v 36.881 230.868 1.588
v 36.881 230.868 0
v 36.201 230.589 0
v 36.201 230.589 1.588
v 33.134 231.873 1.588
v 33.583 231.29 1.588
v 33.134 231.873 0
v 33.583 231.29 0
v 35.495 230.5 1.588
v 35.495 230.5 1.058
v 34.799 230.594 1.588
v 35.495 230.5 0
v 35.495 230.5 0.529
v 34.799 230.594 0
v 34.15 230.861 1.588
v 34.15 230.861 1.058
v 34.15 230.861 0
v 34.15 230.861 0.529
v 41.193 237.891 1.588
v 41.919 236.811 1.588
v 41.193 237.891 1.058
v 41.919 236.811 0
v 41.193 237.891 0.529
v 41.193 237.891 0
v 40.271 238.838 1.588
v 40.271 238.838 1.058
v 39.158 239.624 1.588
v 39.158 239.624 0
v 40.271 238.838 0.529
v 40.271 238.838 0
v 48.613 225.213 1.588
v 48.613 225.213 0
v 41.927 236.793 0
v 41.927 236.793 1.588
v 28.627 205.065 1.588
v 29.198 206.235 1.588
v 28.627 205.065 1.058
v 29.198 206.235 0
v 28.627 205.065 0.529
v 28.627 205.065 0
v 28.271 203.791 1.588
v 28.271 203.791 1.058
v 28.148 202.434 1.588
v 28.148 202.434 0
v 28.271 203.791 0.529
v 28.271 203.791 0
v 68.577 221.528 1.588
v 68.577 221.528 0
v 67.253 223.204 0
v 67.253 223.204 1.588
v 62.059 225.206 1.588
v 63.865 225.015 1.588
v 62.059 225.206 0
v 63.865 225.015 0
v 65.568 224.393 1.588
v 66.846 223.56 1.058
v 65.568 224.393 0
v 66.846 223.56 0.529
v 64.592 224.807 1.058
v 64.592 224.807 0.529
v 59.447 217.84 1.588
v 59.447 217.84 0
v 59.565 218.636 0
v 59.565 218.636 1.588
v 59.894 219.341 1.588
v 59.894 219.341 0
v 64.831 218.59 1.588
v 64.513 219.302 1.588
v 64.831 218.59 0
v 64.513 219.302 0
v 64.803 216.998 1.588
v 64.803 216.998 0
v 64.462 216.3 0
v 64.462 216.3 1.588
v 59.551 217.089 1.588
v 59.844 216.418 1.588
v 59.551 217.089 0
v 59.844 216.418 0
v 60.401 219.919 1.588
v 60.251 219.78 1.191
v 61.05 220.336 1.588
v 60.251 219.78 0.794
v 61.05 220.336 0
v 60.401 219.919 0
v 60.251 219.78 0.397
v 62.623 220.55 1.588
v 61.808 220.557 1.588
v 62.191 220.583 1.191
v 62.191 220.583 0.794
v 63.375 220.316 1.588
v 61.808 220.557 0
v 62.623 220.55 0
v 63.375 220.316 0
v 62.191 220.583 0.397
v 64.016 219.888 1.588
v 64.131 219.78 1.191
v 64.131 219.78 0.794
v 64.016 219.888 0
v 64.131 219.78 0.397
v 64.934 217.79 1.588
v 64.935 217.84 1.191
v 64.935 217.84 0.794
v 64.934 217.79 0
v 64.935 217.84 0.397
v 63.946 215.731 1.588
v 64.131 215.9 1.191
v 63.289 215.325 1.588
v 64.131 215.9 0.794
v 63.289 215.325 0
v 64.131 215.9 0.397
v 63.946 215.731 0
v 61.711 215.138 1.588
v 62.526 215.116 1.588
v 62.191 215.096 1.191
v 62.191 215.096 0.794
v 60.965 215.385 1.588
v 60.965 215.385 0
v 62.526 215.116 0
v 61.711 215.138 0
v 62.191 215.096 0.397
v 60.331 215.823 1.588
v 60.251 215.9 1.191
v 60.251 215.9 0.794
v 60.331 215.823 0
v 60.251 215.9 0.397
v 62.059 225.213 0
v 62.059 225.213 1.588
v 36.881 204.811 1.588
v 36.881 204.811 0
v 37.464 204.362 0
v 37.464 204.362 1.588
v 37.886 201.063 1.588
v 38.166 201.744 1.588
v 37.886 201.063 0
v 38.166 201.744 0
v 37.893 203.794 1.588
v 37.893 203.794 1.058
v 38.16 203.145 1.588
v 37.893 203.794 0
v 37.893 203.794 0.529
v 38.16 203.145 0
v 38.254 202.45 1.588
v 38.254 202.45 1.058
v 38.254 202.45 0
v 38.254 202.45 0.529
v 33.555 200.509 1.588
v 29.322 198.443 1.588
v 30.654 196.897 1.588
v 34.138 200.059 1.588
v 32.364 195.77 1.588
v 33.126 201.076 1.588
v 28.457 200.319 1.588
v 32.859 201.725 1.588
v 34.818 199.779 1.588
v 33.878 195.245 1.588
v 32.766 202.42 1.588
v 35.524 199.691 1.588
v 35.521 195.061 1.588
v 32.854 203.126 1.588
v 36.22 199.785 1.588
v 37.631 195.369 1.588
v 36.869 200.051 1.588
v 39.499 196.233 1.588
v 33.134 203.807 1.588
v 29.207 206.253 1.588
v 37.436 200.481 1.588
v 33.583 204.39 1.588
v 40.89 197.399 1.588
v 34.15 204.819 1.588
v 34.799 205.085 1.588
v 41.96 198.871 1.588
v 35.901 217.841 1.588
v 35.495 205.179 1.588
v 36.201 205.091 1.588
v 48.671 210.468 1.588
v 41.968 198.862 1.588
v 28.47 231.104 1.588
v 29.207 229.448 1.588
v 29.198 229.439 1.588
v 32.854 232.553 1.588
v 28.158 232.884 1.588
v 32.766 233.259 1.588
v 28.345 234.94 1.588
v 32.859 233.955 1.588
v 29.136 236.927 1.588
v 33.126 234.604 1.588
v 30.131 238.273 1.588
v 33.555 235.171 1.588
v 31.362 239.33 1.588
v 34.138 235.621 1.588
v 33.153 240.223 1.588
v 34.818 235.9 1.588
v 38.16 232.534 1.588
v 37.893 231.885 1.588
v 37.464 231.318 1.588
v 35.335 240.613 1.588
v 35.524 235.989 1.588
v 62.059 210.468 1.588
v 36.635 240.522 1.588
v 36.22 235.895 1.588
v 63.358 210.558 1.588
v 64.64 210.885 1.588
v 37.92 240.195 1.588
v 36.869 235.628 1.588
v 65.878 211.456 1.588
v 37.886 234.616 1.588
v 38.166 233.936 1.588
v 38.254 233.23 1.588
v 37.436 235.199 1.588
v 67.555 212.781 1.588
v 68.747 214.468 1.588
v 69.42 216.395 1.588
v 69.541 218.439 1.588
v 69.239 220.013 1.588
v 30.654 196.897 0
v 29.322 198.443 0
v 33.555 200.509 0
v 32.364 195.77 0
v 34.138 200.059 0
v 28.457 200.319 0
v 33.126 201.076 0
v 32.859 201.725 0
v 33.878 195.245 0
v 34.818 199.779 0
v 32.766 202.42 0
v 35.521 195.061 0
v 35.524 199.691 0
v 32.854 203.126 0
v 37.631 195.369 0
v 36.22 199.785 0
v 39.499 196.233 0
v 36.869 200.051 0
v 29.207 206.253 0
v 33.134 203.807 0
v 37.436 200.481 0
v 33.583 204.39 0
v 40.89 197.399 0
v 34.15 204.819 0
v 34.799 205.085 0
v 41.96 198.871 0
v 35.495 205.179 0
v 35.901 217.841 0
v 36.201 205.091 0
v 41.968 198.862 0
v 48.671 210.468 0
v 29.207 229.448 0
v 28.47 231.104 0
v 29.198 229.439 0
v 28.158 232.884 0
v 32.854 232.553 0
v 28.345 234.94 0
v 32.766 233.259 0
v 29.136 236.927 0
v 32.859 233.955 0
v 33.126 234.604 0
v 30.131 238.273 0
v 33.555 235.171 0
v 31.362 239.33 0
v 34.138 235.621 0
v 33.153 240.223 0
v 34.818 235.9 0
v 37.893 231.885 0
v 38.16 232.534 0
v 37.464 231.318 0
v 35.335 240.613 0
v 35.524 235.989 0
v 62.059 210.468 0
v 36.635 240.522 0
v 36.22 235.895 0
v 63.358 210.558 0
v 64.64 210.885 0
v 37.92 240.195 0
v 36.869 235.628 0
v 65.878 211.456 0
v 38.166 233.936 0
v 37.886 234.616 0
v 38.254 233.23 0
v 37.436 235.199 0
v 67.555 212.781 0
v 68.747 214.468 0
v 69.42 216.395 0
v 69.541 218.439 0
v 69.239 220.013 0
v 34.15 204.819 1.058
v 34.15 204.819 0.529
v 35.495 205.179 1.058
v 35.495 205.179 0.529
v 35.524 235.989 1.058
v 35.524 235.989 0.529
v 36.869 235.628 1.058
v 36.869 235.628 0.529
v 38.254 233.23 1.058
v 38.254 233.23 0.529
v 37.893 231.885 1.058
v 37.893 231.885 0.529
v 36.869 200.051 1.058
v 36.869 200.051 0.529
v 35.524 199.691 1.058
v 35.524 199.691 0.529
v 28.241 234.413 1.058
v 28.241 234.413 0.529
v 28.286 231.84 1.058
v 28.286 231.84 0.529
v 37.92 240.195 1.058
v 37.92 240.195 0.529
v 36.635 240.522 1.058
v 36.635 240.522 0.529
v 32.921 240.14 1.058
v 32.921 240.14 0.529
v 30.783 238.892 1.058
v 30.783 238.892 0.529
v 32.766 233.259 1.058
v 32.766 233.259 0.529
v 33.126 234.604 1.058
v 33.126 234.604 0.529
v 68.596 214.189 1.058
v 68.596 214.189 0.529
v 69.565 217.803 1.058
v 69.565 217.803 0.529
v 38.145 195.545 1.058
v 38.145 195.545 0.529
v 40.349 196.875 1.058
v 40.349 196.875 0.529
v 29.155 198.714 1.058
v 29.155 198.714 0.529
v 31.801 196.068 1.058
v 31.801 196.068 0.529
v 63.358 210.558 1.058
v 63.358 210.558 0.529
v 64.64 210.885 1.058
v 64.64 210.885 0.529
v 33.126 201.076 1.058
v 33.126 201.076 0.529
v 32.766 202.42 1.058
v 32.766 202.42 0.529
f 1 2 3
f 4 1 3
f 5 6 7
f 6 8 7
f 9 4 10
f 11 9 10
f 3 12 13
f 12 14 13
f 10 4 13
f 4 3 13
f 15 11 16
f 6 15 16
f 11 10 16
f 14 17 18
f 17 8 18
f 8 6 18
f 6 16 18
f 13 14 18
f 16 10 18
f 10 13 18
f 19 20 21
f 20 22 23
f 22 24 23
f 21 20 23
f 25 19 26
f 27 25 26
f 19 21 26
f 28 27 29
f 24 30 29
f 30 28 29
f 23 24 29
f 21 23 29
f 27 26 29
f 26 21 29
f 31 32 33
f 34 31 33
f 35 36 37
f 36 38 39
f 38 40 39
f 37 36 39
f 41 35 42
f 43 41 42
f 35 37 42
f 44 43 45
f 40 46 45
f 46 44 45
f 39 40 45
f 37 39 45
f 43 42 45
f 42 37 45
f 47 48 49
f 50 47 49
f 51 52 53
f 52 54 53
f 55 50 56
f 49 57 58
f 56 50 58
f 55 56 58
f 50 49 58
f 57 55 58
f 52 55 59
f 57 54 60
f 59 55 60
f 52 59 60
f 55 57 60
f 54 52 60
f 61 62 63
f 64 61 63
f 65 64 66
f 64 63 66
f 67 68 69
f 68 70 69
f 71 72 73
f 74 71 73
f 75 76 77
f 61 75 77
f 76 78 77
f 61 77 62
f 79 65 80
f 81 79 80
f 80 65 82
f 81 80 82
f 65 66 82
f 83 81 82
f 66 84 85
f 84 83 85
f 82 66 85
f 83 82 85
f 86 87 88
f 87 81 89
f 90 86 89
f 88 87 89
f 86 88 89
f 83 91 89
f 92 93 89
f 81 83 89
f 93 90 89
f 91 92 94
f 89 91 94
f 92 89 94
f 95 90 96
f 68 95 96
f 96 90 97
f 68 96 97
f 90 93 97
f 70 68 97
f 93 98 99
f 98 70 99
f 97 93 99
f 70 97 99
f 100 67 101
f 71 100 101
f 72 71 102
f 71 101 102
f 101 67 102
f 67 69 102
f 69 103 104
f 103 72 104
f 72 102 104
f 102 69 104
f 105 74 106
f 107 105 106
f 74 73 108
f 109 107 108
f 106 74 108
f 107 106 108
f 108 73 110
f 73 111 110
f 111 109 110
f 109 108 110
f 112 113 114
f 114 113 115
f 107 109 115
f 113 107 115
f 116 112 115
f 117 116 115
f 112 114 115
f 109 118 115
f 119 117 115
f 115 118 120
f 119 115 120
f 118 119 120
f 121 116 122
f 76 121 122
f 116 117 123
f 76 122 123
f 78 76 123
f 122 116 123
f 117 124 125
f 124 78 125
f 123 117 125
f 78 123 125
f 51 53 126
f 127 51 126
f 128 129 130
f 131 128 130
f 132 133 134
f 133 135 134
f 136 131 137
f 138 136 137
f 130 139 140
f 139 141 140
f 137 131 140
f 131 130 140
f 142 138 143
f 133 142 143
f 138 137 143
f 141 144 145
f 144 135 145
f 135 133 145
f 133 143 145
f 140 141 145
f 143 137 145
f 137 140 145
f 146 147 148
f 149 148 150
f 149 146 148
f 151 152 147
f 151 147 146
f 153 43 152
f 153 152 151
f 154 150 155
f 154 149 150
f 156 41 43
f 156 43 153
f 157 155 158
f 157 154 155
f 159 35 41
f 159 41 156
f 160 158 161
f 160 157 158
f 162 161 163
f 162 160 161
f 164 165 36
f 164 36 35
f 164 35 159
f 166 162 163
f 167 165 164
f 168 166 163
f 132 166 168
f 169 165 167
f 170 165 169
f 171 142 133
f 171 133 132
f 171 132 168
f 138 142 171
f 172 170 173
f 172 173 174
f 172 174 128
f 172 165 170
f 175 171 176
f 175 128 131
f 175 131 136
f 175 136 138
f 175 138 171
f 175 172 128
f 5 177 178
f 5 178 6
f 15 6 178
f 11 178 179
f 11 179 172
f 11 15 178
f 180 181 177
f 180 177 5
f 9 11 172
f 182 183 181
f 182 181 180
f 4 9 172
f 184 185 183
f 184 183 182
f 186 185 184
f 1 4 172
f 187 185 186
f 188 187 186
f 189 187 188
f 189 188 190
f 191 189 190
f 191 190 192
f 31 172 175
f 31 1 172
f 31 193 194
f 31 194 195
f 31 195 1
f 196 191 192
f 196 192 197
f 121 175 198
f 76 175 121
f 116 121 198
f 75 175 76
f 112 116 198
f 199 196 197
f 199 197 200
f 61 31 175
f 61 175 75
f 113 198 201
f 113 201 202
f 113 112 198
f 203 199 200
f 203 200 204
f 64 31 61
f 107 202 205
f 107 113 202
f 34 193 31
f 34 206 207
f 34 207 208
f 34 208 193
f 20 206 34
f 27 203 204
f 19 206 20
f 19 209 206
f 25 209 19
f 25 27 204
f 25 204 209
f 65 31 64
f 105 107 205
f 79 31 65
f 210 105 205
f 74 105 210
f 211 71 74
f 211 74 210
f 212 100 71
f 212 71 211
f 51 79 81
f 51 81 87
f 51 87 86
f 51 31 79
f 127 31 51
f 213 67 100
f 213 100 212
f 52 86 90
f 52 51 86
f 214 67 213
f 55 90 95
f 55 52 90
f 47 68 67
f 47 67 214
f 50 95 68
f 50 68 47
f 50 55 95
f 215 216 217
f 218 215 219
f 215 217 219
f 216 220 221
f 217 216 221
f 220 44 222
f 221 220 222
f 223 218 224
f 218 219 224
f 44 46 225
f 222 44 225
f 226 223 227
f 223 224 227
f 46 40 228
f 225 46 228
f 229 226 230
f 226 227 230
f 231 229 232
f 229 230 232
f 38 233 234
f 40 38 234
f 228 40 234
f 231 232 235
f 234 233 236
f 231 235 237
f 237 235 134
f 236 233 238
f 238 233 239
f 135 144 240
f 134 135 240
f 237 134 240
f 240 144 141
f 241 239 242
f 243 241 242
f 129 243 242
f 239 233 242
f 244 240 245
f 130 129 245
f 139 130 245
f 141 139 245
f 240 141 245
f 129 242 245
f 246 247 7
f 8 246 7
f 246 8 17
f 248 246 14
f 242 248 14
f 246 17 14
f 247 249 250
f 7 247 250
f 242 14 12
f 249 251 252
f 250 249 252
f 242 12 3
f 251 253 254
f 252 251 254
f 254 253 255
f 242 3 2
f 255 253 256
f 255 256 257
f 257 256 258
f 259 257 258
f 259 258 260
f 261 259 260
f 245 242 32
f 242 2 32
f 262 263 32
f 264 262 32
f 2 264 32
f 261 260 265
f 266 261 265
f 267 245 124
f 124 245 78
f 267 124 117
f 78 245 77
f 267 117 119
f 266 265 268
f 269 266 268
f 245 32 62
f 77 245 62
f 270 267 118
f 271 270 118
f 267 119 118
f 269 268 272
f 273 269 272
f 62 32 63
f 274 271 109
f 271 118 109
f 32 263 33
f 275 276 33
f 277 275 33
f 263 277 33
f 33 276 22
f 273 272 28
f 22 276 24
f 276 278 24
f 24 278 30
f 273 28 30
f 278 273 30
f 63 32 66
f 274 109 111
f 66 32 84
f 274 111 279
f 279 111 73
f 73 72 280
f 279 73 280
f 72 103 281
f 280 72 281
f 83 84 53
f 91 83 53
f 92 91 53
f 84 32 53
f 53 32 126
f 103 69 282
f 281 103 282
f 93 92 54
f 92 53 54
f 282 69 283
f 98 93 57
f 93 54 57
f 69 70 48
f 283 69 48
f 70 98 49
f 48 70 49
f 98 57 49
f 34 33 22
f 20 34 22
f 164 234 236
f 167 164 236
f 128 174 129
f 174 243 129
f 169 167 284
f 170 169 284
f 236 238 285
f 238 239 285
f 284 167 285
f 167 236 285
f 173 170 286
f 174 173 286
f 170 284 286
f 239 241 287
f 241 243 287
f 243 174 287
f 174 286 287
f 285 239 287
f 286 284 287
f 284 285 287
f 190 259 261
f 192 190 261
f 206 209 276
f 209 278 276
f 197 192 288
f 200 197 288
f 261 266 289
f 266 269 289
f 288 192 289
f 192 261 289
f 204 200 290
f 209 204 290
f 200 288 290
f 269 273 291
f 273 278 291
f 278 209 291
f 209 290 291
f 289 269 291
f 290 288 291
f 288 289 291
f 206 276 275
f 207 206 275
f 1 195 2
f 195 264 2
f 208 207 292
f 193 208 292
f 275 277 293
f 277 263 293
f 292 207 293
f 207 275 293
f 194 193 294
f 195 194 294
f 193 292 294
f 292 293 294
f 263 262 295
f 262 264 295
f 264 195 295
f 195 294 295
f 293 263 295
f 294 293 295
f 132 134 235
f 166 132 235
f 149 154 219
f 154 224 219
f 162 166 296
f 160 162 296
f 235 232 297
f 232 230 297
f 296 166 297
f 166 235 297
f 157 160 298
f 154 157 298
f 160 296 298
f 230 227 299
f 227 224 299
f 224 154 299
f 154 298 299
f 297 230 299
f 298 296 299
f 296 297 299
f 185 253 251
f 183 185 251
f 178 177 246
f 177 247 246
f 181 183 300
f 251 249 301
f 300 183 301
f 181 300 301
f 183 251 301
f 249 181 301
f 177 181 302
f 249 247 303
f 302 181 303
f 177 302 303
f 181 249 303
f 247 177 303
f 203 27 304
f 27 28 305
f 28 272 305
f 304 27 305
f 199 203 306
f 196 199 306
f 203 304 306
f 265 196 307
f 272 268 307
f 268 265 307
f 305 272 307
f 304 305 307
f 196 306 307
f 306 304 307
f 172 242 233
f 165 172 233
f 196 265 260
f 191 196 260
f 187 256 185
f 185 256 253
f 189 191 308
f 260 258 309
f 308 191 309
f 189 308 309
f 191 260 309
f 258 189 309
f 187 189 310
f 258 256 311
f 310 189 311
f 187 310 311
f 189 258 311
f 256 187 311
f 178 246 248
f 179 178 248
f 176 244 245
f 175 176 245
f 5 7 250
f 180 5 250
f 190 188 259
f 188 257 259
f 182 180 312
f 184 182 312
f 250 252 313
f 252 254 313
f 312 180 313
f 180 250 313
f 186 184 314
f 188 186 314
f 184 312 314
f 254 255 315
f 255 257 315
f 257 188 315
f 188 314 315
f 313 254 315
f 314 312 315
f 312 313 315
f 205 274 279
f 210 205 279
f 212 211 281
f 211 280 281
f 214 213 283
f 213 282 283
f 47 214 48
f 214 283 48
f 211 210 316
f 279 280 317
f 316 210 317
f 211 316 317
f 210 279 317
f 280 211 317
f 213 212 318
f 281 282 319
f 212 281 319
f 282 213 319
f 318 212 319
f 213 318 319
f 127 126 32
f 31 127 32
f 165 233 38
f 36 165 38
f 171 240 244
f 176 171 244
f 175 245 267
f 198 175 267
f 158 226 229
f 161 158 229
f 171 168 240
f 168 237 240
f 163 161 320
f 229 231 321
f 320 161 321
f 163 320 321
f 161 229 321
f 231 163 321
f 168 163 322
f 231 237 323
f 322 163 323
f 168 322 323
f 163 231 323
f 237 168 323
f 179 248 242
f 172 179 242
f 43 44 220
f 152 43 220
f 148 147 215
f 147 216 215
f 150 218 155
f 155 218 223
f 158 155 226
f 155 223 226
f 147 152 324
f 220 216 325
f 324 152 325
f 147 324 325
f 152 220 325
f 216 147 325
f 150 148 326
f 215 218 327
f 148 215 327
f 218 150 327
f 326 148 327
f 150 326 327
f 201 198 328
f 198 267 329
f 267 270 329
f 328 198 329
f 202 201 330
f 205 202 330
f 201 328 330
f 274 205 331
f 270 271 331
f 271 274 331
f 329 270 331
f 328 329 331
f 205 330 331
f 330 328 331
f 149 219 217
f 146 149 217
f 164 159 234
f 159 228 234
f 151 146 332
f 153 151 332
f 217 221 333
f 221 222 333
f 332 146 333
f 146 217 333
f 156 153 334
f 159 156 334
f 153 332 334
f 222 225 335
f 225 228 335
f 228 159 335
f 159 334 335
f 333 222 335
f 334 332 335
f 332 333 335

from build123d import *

# Parameters (mm, degrees)
BOSS_EXTRUDE5_DEPTH = 1.5875


with BuildPart() as part:
    # carrier → Boss-Extrude5 (new body)
    # profile 1 of 2: a face of its own
    with BuildSketch(Plane(origin=(-89.612357323, 67.458483608, 0), x_dir=(1, 0, 0), z_dir=(0, 0, 1))):
        with BuildLine():
            add(Edge.make_bspline(
                [(118.748455038, 169.468215691), (117.360345038, 167.063938691), (117.483199038, 164.211290691), (118.819010038, 161.989326691)],
                knots=[0, 0, 0, 0, 1, 1, 1, 1], degree=3))
            Line((118.819010038, 161.989326691), (118.810191038, 161.980520691))
            Line((118.810191038, 161.980520691), (125.512969038, 150.382951691))
            Line((125.512969038, 150.382951691), (118.819010038, 138.794201691))
            Line((118.819010038, 138.794201691), (118.810191038, 138.776562691))
            add(Edge.make_bspline(
                [(118.810191038, 138.776562691), (118.138894038, 137.665721691), (117.760677038, 136.367990691), (117.760677038, 134.975382691)],
                knots=[0, 0, 0, 0, 1, 1, 1, 1], degree=3))
            add(Edge.make_bspline(
                [(117.760677038, 134.975382691), (117.760675038, 130.905661691), (121.064010038, 127.602323691), (125.133733038, 127.602326691)],
                knots=[0, 0, 0, 0, 1, 1, 1, 1], degree=3))
            add(Edge.make_bspline(
                [(125.133733038, 127.602326691), (127.909953038, 127.602326691), (130.315556038, 129.144498691), (131.571927038, 131.412326691)],
                knots=[0, 0, 0, 0, 1, 1, 1, 1], degree=3))
            Line((131.571927038, 131.412326691), (131.580732038, 131.403521691))
            Line((131.580732038, 131.403521691), (138.283510038, 143.009910691))
            Line((138.283510038, 143.009910691), (151.653788038, 143.009910691))
            Line((151.653788038, 143.009910691), (151.671427038, 143.009910691))
            add(Edge.make_bspline(
                [(151.671427038, 143.009910691), (152.969090038, 142.983973691), (154.284212038, 143.301383691), (155.490246038, 143.997687691)],
                knots=[0, 0, 0, 0, 1, 1, 1, 1], degree=3))
            add(Edge.make_bspline(
                [(155.490246038, 143.997687691), (159.014728038, 146.032549691), (160.223858038, 150.545012691), (158.188996038, 154.069493691)],
                knots=[0, 0, 0, 0, 1, 1, 1, 1], degree=3))
            add(Edge.make_bspline(
                [(158.188996038, 154.069493691), (156.800886038, 156.473769691), (154.263610038, 157.793065691), (151.671427038, 157.747201691)],
                knots=[0, 0, 0, 0, 1, 1, 1, 1], degree=3))
            Line((151.671427038, 157.747201691), (151.671427038, 157.754849091))
            Line((151.671427038, 157.754849091), (138.224971754, 157.754849091))
            Line((138.224971754, 157.754849091), (131.539832754, 169.334779091))
            Line((131.539832754, 169.334779091), (131.531027754, 169.352418091))
            add(Edge.make_bspline(
                [(131.531027754, 169.352418091), (130.904660754, 170.489198091), (129.976575754, 171.469517091), (128.770540754, 172.165821091)],
                knots=[0, 0, 0, 0, 1, 1, 1, 1], degree=3))
            add(Edge.make_bspline(
                [(128.770540754, 172.165821091), (127.565708199, 172.861433534), (126.244241887, 173.179504317), (124.946928377, 173.154056045)],
                knots=[0, 0, 0, 0, 0.994463703, 0.994463703, 0.994463703, 0.994463703], degree=3))
            add(Edge.make_bspline(
                [(124.946928377, 173.154056045), (122.467005204, 173.088633853), (120.078815068, 171.772470761), (118.748455038, 169.468215691)],
                knots=[0.003756223, 0.003756223, 0.003756223, 0.003756223, 1, 1, 1, 1], degree=3))
        make_face()
        with BuildLine():
            add(Edge.make_bspline(
                [(127.49809, 133.604715), (126.740439, 132.292425), (125.062417, 131.8428), (123.750127, 132.600451)],
                knots=[0, 0, 0, 0, 1, 1, 1, 1], degree=3))
            add(Edge.make_bspline(
                [(123.750127, 132.600451), (122.437834, 133.358103), (121.988212, 135.036124), (122.745863, 136.348414)],
                knots=[0, 0, 0, 0, 1, 1, 1, 1], degree=3))
            add(Edge.make_bspline(
                [(122.745863, 136.348414), (123.503515, 137.660706), (125.181534, 138.11033), (126.493826, 137.352678)],
                knots=[0, 0, 0, 0, 1, 1, 1, 1], degree=3))
            add(Edge.make_bspline(
                [(126.493826, 137.352678), (127.806116, 136.595027), (128.255742, 134.917007), (127.49809, 133.604715)],
                knots=[0, 0, 0, 0, 1, 1, 1, 1], degree=3))
        make_face(mode=Mode.SUBTRACT)
        with BuildLine():
            Line((136.683962, 148.224924), (131.348201, 148.224924))
            add(Edge.make_bspline(
                [(130.580909, 150.385688), (130.580909, 149.56754), (130.870517, 148.814777), (131.348201, 148.224924)],
                knots=[0, 0, 0, 0, 1, 1, 1, 1], degree=3))
            add(Edge.make_bspline(
                [(131.348201, 152.537633), (130.870517, 151.94778), (130.580909, 151.203836), (130.580909, 150.385688)],
                knots=[0, 0, 0, 0, 1, 1, 1, 1], degree=3))
            Line((131.348201, 152.537633), (136.683962, 152.537633))
            add(Edge.make_bspline(
                [(137.451253, 150.385688), (137.451253, 151.203836), (137.161645, 151.94778), (136.683962, 152.537633)],
                knots=[0, 0, 0, 0, 1, 1, 1, 1], degree=3))
            add(Edge.make_bspline(
                [(136.683962, 148.224924), (137.161645, 148.814777), (137.451253, 149.56754), (137.451253, 150.385688)],
                knots=[0, 0, 0, 0, 1, 1, 1, 1], degree=3))
        make_face(mode=Mode.SUBTRACT)
        with BuildLine():
            add(Edge.make_bspline(
                [(151.803377, 153.124973), (153.318678, 153.124973), (154.547076, 151.896576), (154.547076, 150.381274)],
                knots=[0, 0, 0, 0, 1, 1, 1, 1], degree=3))
            add(Edge.make_bspline(
                [(154.547076, 150.381274), (154.547076, 148.865969), (153.318678, 147.637574), (151.803377, 147.637574)],
                knots=[0, 0, 0, 0, 1, 1, 1, 1], degree=3))
            add(Edge.make_bspline(
                [(151.803377, 147.637574), (150.288072, 147.637574), (149.059677, 148.865969), (149.059677, 150.381274)],
                knots=[0, 0, 0, 0, 1, 1, 1, 1], degree=3))
            add(Edge.make_bspline(
                [(149.059677, 150.381274), (149.059677, 151.896576), (150.288072, 153.124973), (151.803377, 153.124973)],
                knots=[0, 0, 0, 0, 1, 1, 1, 1], degree=3))
        make_face(mode=Mode.SUBTRACT)
        with BuildLine():
            add(Edge.make_bspline(
                [(122.74586, 164.414132), (121.988209, 165.726422), (122.437834, 167.404444), (123.750123, 168.162095)],
                knots=[0, 0, 0, 0, 1, 1, 1, 1], degree=3))
            add(Edge.make_bspline(
                [(123.750123, 168.162095), (125.062416, 168.919747), (126.740436, 168.470121), (127.498087, 167.157831)],
                knots=[0, 0, 0, 0, 1, 1, 1, 1], degree=3))
            add(Edge.make_bspline(
                [(127.498087, 167.157831), (128.255739, 165.845539), (127.806115, 164.16752), (126.493823, 163.409868)],
                knots=[0, 0, 0, 0, 1, 1, 1, 1], degree=3))
            add(Edge.make_bspline(
                [(126.493823, 163.409868), (125.181533, 162.652217), (123.503512, 163.101839), (122.74586, 164.414132)],
                knots=[0, 0, 0, 0, 1, 1, 1, 1], degree=3))
        make_face(mode=Mode.SUBTRACT)
    # profile 2 of 2: a face of its own
    with BuildSketch(Plane(origin=(-89.612357323, 67.458483608, 0), x_dir=(1, 0, 0), z_dir=(0, 0, 1))):
        with BuildLine():
            add(Edge.make_bspline(
                [(130.580909, 150.385688), (130.580909, 149.56754), (130.870517, 148.814777), (131.348201, 148.224924)],
                knots=[0, 0, 0, 0, 1, 1, 1, 1], degree=3))
            Line((131.348201, 148.224924), (136.683962, 148.224924))
            add(Edge.make_bspline(
                [(136.683962, 148.224924), (137.161645, 148.814777), (137.451253, 149.56754), (137.451253, 150.385688)],
                knots=[0, 0, 0, 0, 1, 1, 1, 1], degree=3))
            add(Edge.make_bspline(
                [(137.451253, 150.385688), (137.451253, 151.203836), (137.161645, 151.94778), (136.683962, 152.537633)],
                knots=[0, 0, 0, 0, 1, 1, 1, 1], degree=3))
            Line((136.683962, 152.537633), (131.348201, 152.537633))
            add(Edge.make_bspline(
                [(131.348201, 152.537633), (130.870517, 151.94778), (130.580909, 151.203836), (130.580909, 150.385688)],
                knots=[0, 0, 0, 0, 1, 1, 1, 1], degree=3))
        make_face()
    extrude(amount=BOSS_EXTRUDE5_DEPTH)


solid = part.part
